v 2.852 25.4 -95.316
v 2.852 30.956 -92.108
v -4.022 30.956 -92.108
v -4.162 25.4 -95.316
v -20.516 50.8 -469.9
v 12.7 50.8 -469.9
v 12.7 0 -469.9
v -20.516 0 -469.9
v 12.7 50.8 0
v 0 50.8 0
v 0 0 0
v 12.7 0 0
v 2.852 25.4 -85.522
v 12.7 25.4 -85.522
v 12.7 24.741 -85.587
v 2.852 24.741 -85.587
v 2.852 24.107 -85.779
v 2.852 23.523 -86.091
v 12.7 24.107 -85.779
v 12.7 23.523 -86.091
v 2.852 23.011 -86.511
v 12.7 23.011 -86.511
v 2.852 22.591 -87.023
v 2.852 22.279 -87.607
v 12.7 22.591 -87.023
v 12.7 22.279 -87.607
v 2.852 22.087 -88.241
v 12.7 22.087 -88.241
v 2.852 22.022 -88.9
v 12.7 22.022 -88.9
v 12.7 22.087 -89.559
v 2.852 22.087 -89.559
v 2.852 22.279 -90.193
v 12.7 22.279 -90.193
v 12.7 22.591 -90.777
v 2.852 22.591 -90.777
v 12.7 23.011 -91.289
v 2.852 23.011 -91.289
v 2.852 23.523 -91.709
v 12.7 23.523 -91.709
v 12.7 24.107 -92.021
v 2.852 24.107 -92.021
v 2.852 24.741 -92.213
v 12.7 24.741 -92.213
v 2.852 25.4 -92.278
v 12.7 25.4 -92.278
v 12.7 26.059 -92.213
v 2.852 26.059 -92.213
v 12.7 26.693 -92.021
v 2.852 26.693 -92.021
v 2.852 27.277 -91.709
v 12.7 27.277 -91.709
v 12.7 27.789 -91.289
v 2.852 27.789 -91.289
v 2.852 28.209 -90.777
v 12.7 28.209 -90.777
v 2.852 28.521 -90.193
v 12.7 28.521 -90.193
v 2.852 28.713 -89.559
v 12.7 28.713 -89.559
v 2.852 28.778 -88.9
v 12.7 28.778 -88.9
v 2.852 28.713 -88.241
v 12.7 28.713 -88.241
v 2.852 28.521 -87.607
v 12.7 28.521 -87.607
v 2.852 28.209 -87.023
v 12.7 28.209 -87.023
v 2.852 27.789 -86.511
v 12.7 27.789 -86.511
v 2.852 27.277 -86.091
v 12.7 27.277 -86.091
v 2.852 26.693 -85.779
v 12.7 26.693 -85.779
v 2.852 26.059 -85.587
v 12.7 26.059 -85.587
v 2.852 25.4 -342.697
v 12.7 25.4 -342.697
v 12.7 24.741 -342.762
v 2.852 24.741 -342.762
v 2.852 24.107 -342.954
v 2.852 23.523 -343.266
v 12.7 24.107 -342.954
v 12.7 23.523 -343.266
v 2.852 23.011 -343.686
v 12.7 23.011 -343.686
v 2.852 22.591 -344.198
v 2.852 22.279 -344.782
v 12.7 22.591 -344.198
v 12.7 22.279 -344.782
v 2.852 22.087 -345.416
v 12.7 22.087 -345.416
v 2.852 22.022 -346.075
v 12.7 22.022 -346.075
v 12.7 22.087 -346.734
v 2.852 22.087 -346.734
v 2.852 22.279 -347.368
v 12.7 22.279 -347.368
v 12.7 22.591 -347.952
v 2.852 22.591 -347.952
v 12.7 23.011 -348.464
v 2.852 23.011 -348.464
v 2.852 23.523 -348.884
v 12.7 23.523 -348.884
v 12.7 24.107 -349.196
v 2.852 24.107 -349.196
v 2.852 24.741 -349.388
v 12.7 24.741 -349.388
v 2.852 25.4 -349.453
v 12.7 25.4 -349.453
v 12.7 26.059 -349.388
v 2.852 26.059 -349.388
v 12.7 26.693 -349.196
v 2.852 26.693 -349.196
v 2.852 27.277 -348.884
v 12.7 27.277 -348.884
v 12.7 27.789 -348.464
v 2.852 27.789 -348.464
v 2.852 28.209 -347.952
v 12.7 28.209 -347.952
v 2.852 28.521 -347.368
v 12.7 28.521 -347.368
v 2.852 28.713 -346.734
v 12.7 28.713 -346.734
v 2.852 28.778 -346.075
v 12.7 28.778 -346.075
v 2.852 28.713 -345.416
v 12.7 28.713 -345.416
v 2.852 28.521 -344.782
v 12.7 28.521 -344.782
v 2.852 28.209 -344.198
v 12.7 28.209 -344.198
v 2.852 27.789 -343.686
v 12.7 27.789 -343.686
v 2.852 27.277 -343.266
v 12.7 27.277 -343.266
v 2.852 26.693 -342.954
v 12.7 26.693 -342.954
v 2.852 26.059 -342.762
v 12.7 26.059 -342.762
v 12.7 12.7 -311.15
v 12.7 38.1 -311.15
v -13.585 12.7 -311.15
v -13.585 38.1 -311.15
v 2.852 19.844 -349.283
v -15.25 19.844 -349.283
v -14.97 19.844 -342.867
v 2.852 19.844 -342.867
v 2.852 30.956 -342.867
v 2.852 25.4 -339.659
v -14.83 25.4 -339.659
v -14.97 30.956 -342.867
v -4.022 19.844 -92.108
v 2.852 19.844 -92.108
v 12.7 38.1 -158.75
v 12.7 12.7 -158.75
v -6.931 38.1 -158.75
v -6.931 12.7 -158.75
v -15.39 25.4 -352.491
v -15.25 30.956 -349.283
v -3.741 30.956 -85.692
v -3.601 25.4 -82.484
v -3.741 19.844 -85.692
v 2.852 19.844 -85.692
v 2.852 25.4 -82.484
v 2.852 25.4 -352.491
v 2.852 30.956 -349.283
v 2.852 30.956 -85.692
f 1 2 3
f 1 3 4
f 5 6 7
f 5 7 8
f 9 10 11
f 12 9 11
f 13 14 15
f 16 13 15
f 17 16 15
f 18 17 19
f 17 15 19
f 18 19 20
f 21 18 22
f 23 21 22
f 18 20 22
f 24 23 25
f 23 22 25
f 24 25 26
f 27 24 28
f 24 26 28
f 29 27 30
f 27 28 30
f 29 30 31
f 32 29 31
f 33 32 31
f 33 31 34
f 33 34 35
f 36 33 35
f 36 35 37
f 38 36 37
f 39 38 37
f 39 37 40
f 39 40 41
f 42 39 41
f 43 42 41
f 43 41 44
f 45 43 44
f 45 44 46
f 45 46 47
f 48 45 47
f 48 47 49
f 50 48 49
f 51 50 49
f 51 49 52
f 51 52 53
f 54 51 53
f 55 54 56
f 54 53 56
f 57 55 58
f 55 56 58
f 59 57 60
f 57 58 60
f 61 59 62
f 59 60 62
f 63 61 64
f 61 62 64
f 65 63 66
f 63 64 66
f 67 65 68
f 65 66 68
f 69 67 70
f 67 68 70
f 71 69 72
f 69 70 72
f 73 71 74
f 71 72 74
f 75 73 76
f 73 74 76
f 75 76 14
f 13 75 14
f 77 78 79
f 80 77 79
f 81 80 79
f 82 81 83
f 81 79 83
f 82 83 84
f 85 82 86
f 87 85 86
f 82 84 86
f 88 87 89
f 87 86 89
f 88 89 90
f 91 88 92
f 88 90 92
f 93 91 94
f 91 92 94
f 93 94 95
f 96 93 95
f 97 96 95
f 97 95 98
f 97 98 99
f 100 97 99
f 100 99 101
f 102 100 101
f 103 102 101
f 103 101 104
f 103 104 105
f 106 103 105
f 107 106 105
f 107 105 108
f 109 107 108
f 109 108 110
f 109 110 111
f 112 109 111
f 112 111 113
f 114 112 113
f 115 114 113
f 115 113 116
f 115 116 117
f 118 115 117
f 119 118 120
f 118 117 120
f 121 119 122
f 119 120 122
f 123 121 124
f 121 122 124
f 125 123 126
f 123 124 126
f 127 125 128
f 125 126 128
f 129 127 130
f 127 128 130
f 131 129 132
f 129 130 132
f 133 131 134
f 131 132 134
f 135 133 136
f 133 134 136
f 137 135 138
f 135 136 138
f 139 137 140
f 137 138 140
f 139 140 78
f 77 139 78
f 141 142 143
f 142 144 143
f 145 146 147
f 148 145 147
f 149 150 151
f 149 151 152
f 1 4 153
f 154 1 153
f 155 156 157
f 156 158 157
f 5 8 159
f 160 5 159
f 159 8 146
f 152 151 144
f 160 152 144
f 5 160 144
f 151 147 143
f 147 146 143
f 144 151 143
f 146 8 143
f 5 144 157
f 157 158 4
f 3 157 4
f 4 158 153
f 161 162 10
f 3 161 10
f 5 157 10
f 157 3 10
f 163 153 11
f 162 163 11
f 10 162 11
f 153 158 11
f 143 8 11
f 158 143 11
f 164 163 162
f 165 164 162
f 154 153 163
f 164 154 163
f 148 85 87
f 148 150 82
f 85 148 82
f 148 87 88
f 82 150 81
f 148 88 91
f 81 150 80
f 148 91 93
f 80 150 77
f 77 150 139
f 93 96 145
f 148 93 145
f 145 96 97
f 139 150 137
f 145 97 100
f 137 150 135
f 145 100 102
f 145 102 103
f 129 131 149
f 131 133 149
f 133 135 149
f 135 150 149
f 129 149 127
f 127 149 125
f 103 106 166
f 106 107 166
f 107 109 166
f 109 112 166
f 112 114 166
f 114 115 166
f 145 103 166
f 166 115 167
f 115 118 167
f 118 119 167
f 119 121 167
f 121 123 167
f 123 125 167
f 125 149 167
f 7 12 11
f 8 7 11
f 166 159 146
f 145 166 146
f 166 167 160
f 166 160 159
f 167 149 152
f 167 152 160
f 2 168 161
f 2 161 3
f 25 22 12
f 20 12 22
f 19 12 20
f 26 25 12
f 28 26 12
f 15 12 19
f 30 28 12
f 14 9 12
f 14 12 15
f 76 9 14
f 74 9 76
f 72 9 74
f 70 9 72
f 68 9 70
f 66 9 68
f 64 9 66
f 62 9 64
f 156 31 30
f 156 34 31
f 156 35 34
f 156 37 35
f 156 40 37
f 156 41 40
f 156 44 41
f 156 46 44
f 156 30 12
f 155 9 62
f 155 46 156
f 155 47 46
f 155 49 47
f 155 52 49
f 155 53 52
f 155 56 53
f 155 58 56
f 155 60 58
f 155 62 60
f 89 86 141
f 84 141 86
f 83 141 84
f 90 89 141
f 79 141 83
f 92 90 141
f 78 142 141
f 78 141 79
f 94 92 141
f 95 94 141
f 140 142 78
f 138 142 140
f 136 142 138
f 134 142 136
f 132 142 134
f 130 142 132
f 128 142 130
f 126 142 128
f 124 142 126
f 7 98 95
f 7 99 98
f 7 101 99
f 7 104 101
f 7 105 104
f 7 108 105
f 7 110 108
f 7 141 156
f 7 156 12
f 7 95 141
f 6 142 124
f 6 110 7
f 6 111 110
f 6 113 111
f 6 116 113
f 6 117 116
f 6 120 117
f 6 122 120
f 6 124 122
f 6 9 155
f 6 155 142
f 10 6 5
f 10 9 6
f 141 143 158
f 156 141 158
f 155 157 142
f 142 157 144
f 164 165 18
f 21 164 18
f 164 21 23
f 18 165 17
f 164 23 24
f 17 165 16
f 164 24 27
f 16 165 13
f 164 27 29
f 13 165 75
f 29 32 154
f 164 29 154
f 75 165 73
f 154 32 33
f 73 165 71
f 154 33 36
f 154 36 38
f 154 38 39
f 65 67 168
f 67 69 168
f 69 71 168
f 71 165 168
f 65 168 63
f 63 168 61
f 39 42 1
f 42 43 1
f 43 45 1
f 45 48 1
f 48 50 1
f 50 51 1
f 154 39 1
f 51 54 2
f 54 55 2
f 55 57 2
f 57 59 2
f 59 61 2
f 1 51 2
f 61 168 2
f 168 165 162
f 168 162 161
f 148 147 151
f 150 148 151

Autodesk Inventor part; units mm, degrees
ref_plane "YZ Plane" through (0, 0, 0) normal (1, 0, 0) x (0, 1, 0)
ref_plane "XZ Plane" through (0, 0, 0) normal (0, 1, 0) x (-1, 0, 0)
sketch "Sketch1" plane through (0, 0, 0) normal (0, 1, 0) x (-1, 0, 0)
  line L0 (0, 0) -> (0, -469.9)
  line L1 (0, -469.9) -> (0, -122.0086)
  line L2 (0, -469.9) -> (20.5163, -469.9)
  line L3 (20.5163, -469.9) -> (0, 0)
  dimension "d0" = 469.9
  dimension "d1" = 2.5
extrude "Extrusion1" add sketch "Sketch1" along normal blind 50.8
ref_plane "Work Plane1" through (-20.5163, 50.8, -469.9) normal (1, 0, 0) x (0, 0, -1)
sketch "Sketch2" plane through (0, 0, 0) normal (1, 0, 0) x (0, 0, -1)
  line L0 (0, 0) -> (469.9, 0) projected
  line L1 (0, 50.8) -> (469.9, 50.8) projected
  line L2 (0, 0) -> (469.9, 0)
  line L3 (469.9, 0) -> (469.9, 50.8)
  line L4 (469.9, 50.8) -> (0, 50.8)
  line L5 (0, 50.8) -> (0, 0)
extrude "Extrusion2" add sketch "Sketch2" along normal blind 12.7
sketch "Sketch4" plane through (-20.5163, 50.8, -469.9) normal (1, 0, 0) x (0, 0, -1)
  line L0 (0, -50.8) -> (0, 0) construction
  line L1 (0, -25.4) -> (-279.4, -25.4) construction
  line L2 (0, -50.8) -> (-469.9, -50.8) construction
  line L3 (-469.9, -50.8) -> (-469.9, 0) construction
  point P0 (-381, -25.4)
  point P1 (-123.825, -25.4)
  point P2 (-469.9, 0)
  dimension "d16" = 25.4
  dimension "d17" = 88.9
  dimension "d18" = 346.075
hole "Hole2" at (-20.5163, 25.4, -88.9) at (-20.5163, 25.4, -346.075) direction (1, 0, 0) diameter 6.7564 end through all clearance for "Flat Head Machine Screw (82)" size "1/4" standard "Ansi Unified Screw Threads"
sketch "Sketch6" plane through (-20.5163, 50.8, -469.9) normal (1, 0, 0) x (0, 0, -1)
  circle A0 centre (-123.825, -25.4) radius 3.3782 projected
  line L0 (-130.2408, -25.4) -> (-127.0329, -19.8438)
  line L1 (-127.0329, -19.8438) -> (-120.6171, -19.8438)
  line L2 (-120.6171, -19.8438) -> (-117.4092, -25.4)
  line L3 (-117.4092, -25.4) -> (-120.6171, -30.9563)
  line L4 (-120.6171, -30.9563) -> (-127.0329, -30.9562)
  line L5 (-127.0329, -30.9562) -> (-130.2408, -25.4)
  circle A1 centre (-381, -25.4) radius 3.3782 projected
  line L6 (-387.4158, -25.4) -> (-384.2079, -19.8438)
  line L7 (-384.2079, -19.8438) -> (-377.7921, -19.8438)
  line L8 (-377.7921, -19.8438) -> (-374.5842, -25.4)
  line L9 (-374.5842, -25.4) -> (-377.7921, -30.9563)
  line L10 (-377.7921, -30.9563) -> (-384.2079, -30.9563)
  line L11 (-384.2079, -30.9563) -> (-387.4158, -25.4)
  line L12 (0, 0) -> (-469.9, 0) projected
  point P0 (-469.9, -50.8)
  dimension "d26" = 11.1125
extrude "Extrusion3" cut sketch "Sketch6" along normal blind 23.368
ref_plane "Work Plane2" through (-20.5163, 0, -234.95) normal (0, 0, -1) x (-1, 0, 0)
sketch "Sketch8" plane through (-20.5163, 50.8, -469.9) normal (1, 0, 0) x (0, 0, -1)
  circle A0 centre (-123.825, -25.4) radius 3.3782 construction
  circle A1 centre (-381, -25.4) radius 3.3782 construction
  line L0 (-123.825, -25.4) -> (-381, -25.4) construction
  line L1 (0, 0) -> (-469.9, 0) construction
  line L2 (-234.95, 0) -> (-234.95, -50.8) construction
  line L3 (-158.75, -38.1) -> (-311.15, -38.1)
  line L4 (-311.15, -38.1) -> (-311.15, -12.7)
  line L5 (-311.15, -12.7) -> (-158.75, -12.7)
  line L6 (-158.75, -12.7) -> (-158.75, -38.1)
  line L7 (-158.75, -38.1) -> (-311.15, -12.7) construction
  line L8 (-311.15, -38.1) -> (-158.75, -12.7) construction
  point P0 (-469.9, -50.8)
  point P1 (-234.95, -25.4)
  dimension "d30" = 25.4
  dimension "d31" = 152.4
extrude "Extrusion4" cut sketch "Sketch8" along normal through all
equation "\"d0\" = lengthOfFixture"
equation "\"d1\" = cutAngle"
equation "\"d2\" = heightOfJig"
equation "\"d4\" = addedDepthToSupportBolts"
equation "\"d16\" = heightOfBoltHolt"
equation "\"d17\" = bottomToFirstHole"
equation "\"d18\" = bottomToSecondHole"
equation "\"d26\" = hexBoltDiameter"
equation "\"d27\" = depthOfHoleForHexBolt + clearanceForHexbolt"
equation "\"lengthOfFixture\" = 469.9"
equation "\"cutAngle\" = 2.5deg"
equation "\"bottomToFirstHole\" = 88.9"
equation "\"distanceBetweenBolts\" = 257.175"
equation "\"bottomToSecondHole\" = bottomToFirstHole + distanceBetweenBolts"
equation "\"heightOfBoltHolt\" = 25.4"
equation "\"boltSize\" = 6.35"
equation "\"heightOfJig\" = 50.8"
equation "\"addedDepthToSupportBolts\" = 12.7"
equation "\"depthOfHoleForHexBolt\" = 22.86"
equation "\"hexBoltDiameter\" = 11.1125"
equation "\"clearanceForHexbolt\" = 0.508"
equation "\"d29\" = -0.5 * lengthOfFixture"
properties part number "jigForRipCuts" material "PC/ABS Plastic"
